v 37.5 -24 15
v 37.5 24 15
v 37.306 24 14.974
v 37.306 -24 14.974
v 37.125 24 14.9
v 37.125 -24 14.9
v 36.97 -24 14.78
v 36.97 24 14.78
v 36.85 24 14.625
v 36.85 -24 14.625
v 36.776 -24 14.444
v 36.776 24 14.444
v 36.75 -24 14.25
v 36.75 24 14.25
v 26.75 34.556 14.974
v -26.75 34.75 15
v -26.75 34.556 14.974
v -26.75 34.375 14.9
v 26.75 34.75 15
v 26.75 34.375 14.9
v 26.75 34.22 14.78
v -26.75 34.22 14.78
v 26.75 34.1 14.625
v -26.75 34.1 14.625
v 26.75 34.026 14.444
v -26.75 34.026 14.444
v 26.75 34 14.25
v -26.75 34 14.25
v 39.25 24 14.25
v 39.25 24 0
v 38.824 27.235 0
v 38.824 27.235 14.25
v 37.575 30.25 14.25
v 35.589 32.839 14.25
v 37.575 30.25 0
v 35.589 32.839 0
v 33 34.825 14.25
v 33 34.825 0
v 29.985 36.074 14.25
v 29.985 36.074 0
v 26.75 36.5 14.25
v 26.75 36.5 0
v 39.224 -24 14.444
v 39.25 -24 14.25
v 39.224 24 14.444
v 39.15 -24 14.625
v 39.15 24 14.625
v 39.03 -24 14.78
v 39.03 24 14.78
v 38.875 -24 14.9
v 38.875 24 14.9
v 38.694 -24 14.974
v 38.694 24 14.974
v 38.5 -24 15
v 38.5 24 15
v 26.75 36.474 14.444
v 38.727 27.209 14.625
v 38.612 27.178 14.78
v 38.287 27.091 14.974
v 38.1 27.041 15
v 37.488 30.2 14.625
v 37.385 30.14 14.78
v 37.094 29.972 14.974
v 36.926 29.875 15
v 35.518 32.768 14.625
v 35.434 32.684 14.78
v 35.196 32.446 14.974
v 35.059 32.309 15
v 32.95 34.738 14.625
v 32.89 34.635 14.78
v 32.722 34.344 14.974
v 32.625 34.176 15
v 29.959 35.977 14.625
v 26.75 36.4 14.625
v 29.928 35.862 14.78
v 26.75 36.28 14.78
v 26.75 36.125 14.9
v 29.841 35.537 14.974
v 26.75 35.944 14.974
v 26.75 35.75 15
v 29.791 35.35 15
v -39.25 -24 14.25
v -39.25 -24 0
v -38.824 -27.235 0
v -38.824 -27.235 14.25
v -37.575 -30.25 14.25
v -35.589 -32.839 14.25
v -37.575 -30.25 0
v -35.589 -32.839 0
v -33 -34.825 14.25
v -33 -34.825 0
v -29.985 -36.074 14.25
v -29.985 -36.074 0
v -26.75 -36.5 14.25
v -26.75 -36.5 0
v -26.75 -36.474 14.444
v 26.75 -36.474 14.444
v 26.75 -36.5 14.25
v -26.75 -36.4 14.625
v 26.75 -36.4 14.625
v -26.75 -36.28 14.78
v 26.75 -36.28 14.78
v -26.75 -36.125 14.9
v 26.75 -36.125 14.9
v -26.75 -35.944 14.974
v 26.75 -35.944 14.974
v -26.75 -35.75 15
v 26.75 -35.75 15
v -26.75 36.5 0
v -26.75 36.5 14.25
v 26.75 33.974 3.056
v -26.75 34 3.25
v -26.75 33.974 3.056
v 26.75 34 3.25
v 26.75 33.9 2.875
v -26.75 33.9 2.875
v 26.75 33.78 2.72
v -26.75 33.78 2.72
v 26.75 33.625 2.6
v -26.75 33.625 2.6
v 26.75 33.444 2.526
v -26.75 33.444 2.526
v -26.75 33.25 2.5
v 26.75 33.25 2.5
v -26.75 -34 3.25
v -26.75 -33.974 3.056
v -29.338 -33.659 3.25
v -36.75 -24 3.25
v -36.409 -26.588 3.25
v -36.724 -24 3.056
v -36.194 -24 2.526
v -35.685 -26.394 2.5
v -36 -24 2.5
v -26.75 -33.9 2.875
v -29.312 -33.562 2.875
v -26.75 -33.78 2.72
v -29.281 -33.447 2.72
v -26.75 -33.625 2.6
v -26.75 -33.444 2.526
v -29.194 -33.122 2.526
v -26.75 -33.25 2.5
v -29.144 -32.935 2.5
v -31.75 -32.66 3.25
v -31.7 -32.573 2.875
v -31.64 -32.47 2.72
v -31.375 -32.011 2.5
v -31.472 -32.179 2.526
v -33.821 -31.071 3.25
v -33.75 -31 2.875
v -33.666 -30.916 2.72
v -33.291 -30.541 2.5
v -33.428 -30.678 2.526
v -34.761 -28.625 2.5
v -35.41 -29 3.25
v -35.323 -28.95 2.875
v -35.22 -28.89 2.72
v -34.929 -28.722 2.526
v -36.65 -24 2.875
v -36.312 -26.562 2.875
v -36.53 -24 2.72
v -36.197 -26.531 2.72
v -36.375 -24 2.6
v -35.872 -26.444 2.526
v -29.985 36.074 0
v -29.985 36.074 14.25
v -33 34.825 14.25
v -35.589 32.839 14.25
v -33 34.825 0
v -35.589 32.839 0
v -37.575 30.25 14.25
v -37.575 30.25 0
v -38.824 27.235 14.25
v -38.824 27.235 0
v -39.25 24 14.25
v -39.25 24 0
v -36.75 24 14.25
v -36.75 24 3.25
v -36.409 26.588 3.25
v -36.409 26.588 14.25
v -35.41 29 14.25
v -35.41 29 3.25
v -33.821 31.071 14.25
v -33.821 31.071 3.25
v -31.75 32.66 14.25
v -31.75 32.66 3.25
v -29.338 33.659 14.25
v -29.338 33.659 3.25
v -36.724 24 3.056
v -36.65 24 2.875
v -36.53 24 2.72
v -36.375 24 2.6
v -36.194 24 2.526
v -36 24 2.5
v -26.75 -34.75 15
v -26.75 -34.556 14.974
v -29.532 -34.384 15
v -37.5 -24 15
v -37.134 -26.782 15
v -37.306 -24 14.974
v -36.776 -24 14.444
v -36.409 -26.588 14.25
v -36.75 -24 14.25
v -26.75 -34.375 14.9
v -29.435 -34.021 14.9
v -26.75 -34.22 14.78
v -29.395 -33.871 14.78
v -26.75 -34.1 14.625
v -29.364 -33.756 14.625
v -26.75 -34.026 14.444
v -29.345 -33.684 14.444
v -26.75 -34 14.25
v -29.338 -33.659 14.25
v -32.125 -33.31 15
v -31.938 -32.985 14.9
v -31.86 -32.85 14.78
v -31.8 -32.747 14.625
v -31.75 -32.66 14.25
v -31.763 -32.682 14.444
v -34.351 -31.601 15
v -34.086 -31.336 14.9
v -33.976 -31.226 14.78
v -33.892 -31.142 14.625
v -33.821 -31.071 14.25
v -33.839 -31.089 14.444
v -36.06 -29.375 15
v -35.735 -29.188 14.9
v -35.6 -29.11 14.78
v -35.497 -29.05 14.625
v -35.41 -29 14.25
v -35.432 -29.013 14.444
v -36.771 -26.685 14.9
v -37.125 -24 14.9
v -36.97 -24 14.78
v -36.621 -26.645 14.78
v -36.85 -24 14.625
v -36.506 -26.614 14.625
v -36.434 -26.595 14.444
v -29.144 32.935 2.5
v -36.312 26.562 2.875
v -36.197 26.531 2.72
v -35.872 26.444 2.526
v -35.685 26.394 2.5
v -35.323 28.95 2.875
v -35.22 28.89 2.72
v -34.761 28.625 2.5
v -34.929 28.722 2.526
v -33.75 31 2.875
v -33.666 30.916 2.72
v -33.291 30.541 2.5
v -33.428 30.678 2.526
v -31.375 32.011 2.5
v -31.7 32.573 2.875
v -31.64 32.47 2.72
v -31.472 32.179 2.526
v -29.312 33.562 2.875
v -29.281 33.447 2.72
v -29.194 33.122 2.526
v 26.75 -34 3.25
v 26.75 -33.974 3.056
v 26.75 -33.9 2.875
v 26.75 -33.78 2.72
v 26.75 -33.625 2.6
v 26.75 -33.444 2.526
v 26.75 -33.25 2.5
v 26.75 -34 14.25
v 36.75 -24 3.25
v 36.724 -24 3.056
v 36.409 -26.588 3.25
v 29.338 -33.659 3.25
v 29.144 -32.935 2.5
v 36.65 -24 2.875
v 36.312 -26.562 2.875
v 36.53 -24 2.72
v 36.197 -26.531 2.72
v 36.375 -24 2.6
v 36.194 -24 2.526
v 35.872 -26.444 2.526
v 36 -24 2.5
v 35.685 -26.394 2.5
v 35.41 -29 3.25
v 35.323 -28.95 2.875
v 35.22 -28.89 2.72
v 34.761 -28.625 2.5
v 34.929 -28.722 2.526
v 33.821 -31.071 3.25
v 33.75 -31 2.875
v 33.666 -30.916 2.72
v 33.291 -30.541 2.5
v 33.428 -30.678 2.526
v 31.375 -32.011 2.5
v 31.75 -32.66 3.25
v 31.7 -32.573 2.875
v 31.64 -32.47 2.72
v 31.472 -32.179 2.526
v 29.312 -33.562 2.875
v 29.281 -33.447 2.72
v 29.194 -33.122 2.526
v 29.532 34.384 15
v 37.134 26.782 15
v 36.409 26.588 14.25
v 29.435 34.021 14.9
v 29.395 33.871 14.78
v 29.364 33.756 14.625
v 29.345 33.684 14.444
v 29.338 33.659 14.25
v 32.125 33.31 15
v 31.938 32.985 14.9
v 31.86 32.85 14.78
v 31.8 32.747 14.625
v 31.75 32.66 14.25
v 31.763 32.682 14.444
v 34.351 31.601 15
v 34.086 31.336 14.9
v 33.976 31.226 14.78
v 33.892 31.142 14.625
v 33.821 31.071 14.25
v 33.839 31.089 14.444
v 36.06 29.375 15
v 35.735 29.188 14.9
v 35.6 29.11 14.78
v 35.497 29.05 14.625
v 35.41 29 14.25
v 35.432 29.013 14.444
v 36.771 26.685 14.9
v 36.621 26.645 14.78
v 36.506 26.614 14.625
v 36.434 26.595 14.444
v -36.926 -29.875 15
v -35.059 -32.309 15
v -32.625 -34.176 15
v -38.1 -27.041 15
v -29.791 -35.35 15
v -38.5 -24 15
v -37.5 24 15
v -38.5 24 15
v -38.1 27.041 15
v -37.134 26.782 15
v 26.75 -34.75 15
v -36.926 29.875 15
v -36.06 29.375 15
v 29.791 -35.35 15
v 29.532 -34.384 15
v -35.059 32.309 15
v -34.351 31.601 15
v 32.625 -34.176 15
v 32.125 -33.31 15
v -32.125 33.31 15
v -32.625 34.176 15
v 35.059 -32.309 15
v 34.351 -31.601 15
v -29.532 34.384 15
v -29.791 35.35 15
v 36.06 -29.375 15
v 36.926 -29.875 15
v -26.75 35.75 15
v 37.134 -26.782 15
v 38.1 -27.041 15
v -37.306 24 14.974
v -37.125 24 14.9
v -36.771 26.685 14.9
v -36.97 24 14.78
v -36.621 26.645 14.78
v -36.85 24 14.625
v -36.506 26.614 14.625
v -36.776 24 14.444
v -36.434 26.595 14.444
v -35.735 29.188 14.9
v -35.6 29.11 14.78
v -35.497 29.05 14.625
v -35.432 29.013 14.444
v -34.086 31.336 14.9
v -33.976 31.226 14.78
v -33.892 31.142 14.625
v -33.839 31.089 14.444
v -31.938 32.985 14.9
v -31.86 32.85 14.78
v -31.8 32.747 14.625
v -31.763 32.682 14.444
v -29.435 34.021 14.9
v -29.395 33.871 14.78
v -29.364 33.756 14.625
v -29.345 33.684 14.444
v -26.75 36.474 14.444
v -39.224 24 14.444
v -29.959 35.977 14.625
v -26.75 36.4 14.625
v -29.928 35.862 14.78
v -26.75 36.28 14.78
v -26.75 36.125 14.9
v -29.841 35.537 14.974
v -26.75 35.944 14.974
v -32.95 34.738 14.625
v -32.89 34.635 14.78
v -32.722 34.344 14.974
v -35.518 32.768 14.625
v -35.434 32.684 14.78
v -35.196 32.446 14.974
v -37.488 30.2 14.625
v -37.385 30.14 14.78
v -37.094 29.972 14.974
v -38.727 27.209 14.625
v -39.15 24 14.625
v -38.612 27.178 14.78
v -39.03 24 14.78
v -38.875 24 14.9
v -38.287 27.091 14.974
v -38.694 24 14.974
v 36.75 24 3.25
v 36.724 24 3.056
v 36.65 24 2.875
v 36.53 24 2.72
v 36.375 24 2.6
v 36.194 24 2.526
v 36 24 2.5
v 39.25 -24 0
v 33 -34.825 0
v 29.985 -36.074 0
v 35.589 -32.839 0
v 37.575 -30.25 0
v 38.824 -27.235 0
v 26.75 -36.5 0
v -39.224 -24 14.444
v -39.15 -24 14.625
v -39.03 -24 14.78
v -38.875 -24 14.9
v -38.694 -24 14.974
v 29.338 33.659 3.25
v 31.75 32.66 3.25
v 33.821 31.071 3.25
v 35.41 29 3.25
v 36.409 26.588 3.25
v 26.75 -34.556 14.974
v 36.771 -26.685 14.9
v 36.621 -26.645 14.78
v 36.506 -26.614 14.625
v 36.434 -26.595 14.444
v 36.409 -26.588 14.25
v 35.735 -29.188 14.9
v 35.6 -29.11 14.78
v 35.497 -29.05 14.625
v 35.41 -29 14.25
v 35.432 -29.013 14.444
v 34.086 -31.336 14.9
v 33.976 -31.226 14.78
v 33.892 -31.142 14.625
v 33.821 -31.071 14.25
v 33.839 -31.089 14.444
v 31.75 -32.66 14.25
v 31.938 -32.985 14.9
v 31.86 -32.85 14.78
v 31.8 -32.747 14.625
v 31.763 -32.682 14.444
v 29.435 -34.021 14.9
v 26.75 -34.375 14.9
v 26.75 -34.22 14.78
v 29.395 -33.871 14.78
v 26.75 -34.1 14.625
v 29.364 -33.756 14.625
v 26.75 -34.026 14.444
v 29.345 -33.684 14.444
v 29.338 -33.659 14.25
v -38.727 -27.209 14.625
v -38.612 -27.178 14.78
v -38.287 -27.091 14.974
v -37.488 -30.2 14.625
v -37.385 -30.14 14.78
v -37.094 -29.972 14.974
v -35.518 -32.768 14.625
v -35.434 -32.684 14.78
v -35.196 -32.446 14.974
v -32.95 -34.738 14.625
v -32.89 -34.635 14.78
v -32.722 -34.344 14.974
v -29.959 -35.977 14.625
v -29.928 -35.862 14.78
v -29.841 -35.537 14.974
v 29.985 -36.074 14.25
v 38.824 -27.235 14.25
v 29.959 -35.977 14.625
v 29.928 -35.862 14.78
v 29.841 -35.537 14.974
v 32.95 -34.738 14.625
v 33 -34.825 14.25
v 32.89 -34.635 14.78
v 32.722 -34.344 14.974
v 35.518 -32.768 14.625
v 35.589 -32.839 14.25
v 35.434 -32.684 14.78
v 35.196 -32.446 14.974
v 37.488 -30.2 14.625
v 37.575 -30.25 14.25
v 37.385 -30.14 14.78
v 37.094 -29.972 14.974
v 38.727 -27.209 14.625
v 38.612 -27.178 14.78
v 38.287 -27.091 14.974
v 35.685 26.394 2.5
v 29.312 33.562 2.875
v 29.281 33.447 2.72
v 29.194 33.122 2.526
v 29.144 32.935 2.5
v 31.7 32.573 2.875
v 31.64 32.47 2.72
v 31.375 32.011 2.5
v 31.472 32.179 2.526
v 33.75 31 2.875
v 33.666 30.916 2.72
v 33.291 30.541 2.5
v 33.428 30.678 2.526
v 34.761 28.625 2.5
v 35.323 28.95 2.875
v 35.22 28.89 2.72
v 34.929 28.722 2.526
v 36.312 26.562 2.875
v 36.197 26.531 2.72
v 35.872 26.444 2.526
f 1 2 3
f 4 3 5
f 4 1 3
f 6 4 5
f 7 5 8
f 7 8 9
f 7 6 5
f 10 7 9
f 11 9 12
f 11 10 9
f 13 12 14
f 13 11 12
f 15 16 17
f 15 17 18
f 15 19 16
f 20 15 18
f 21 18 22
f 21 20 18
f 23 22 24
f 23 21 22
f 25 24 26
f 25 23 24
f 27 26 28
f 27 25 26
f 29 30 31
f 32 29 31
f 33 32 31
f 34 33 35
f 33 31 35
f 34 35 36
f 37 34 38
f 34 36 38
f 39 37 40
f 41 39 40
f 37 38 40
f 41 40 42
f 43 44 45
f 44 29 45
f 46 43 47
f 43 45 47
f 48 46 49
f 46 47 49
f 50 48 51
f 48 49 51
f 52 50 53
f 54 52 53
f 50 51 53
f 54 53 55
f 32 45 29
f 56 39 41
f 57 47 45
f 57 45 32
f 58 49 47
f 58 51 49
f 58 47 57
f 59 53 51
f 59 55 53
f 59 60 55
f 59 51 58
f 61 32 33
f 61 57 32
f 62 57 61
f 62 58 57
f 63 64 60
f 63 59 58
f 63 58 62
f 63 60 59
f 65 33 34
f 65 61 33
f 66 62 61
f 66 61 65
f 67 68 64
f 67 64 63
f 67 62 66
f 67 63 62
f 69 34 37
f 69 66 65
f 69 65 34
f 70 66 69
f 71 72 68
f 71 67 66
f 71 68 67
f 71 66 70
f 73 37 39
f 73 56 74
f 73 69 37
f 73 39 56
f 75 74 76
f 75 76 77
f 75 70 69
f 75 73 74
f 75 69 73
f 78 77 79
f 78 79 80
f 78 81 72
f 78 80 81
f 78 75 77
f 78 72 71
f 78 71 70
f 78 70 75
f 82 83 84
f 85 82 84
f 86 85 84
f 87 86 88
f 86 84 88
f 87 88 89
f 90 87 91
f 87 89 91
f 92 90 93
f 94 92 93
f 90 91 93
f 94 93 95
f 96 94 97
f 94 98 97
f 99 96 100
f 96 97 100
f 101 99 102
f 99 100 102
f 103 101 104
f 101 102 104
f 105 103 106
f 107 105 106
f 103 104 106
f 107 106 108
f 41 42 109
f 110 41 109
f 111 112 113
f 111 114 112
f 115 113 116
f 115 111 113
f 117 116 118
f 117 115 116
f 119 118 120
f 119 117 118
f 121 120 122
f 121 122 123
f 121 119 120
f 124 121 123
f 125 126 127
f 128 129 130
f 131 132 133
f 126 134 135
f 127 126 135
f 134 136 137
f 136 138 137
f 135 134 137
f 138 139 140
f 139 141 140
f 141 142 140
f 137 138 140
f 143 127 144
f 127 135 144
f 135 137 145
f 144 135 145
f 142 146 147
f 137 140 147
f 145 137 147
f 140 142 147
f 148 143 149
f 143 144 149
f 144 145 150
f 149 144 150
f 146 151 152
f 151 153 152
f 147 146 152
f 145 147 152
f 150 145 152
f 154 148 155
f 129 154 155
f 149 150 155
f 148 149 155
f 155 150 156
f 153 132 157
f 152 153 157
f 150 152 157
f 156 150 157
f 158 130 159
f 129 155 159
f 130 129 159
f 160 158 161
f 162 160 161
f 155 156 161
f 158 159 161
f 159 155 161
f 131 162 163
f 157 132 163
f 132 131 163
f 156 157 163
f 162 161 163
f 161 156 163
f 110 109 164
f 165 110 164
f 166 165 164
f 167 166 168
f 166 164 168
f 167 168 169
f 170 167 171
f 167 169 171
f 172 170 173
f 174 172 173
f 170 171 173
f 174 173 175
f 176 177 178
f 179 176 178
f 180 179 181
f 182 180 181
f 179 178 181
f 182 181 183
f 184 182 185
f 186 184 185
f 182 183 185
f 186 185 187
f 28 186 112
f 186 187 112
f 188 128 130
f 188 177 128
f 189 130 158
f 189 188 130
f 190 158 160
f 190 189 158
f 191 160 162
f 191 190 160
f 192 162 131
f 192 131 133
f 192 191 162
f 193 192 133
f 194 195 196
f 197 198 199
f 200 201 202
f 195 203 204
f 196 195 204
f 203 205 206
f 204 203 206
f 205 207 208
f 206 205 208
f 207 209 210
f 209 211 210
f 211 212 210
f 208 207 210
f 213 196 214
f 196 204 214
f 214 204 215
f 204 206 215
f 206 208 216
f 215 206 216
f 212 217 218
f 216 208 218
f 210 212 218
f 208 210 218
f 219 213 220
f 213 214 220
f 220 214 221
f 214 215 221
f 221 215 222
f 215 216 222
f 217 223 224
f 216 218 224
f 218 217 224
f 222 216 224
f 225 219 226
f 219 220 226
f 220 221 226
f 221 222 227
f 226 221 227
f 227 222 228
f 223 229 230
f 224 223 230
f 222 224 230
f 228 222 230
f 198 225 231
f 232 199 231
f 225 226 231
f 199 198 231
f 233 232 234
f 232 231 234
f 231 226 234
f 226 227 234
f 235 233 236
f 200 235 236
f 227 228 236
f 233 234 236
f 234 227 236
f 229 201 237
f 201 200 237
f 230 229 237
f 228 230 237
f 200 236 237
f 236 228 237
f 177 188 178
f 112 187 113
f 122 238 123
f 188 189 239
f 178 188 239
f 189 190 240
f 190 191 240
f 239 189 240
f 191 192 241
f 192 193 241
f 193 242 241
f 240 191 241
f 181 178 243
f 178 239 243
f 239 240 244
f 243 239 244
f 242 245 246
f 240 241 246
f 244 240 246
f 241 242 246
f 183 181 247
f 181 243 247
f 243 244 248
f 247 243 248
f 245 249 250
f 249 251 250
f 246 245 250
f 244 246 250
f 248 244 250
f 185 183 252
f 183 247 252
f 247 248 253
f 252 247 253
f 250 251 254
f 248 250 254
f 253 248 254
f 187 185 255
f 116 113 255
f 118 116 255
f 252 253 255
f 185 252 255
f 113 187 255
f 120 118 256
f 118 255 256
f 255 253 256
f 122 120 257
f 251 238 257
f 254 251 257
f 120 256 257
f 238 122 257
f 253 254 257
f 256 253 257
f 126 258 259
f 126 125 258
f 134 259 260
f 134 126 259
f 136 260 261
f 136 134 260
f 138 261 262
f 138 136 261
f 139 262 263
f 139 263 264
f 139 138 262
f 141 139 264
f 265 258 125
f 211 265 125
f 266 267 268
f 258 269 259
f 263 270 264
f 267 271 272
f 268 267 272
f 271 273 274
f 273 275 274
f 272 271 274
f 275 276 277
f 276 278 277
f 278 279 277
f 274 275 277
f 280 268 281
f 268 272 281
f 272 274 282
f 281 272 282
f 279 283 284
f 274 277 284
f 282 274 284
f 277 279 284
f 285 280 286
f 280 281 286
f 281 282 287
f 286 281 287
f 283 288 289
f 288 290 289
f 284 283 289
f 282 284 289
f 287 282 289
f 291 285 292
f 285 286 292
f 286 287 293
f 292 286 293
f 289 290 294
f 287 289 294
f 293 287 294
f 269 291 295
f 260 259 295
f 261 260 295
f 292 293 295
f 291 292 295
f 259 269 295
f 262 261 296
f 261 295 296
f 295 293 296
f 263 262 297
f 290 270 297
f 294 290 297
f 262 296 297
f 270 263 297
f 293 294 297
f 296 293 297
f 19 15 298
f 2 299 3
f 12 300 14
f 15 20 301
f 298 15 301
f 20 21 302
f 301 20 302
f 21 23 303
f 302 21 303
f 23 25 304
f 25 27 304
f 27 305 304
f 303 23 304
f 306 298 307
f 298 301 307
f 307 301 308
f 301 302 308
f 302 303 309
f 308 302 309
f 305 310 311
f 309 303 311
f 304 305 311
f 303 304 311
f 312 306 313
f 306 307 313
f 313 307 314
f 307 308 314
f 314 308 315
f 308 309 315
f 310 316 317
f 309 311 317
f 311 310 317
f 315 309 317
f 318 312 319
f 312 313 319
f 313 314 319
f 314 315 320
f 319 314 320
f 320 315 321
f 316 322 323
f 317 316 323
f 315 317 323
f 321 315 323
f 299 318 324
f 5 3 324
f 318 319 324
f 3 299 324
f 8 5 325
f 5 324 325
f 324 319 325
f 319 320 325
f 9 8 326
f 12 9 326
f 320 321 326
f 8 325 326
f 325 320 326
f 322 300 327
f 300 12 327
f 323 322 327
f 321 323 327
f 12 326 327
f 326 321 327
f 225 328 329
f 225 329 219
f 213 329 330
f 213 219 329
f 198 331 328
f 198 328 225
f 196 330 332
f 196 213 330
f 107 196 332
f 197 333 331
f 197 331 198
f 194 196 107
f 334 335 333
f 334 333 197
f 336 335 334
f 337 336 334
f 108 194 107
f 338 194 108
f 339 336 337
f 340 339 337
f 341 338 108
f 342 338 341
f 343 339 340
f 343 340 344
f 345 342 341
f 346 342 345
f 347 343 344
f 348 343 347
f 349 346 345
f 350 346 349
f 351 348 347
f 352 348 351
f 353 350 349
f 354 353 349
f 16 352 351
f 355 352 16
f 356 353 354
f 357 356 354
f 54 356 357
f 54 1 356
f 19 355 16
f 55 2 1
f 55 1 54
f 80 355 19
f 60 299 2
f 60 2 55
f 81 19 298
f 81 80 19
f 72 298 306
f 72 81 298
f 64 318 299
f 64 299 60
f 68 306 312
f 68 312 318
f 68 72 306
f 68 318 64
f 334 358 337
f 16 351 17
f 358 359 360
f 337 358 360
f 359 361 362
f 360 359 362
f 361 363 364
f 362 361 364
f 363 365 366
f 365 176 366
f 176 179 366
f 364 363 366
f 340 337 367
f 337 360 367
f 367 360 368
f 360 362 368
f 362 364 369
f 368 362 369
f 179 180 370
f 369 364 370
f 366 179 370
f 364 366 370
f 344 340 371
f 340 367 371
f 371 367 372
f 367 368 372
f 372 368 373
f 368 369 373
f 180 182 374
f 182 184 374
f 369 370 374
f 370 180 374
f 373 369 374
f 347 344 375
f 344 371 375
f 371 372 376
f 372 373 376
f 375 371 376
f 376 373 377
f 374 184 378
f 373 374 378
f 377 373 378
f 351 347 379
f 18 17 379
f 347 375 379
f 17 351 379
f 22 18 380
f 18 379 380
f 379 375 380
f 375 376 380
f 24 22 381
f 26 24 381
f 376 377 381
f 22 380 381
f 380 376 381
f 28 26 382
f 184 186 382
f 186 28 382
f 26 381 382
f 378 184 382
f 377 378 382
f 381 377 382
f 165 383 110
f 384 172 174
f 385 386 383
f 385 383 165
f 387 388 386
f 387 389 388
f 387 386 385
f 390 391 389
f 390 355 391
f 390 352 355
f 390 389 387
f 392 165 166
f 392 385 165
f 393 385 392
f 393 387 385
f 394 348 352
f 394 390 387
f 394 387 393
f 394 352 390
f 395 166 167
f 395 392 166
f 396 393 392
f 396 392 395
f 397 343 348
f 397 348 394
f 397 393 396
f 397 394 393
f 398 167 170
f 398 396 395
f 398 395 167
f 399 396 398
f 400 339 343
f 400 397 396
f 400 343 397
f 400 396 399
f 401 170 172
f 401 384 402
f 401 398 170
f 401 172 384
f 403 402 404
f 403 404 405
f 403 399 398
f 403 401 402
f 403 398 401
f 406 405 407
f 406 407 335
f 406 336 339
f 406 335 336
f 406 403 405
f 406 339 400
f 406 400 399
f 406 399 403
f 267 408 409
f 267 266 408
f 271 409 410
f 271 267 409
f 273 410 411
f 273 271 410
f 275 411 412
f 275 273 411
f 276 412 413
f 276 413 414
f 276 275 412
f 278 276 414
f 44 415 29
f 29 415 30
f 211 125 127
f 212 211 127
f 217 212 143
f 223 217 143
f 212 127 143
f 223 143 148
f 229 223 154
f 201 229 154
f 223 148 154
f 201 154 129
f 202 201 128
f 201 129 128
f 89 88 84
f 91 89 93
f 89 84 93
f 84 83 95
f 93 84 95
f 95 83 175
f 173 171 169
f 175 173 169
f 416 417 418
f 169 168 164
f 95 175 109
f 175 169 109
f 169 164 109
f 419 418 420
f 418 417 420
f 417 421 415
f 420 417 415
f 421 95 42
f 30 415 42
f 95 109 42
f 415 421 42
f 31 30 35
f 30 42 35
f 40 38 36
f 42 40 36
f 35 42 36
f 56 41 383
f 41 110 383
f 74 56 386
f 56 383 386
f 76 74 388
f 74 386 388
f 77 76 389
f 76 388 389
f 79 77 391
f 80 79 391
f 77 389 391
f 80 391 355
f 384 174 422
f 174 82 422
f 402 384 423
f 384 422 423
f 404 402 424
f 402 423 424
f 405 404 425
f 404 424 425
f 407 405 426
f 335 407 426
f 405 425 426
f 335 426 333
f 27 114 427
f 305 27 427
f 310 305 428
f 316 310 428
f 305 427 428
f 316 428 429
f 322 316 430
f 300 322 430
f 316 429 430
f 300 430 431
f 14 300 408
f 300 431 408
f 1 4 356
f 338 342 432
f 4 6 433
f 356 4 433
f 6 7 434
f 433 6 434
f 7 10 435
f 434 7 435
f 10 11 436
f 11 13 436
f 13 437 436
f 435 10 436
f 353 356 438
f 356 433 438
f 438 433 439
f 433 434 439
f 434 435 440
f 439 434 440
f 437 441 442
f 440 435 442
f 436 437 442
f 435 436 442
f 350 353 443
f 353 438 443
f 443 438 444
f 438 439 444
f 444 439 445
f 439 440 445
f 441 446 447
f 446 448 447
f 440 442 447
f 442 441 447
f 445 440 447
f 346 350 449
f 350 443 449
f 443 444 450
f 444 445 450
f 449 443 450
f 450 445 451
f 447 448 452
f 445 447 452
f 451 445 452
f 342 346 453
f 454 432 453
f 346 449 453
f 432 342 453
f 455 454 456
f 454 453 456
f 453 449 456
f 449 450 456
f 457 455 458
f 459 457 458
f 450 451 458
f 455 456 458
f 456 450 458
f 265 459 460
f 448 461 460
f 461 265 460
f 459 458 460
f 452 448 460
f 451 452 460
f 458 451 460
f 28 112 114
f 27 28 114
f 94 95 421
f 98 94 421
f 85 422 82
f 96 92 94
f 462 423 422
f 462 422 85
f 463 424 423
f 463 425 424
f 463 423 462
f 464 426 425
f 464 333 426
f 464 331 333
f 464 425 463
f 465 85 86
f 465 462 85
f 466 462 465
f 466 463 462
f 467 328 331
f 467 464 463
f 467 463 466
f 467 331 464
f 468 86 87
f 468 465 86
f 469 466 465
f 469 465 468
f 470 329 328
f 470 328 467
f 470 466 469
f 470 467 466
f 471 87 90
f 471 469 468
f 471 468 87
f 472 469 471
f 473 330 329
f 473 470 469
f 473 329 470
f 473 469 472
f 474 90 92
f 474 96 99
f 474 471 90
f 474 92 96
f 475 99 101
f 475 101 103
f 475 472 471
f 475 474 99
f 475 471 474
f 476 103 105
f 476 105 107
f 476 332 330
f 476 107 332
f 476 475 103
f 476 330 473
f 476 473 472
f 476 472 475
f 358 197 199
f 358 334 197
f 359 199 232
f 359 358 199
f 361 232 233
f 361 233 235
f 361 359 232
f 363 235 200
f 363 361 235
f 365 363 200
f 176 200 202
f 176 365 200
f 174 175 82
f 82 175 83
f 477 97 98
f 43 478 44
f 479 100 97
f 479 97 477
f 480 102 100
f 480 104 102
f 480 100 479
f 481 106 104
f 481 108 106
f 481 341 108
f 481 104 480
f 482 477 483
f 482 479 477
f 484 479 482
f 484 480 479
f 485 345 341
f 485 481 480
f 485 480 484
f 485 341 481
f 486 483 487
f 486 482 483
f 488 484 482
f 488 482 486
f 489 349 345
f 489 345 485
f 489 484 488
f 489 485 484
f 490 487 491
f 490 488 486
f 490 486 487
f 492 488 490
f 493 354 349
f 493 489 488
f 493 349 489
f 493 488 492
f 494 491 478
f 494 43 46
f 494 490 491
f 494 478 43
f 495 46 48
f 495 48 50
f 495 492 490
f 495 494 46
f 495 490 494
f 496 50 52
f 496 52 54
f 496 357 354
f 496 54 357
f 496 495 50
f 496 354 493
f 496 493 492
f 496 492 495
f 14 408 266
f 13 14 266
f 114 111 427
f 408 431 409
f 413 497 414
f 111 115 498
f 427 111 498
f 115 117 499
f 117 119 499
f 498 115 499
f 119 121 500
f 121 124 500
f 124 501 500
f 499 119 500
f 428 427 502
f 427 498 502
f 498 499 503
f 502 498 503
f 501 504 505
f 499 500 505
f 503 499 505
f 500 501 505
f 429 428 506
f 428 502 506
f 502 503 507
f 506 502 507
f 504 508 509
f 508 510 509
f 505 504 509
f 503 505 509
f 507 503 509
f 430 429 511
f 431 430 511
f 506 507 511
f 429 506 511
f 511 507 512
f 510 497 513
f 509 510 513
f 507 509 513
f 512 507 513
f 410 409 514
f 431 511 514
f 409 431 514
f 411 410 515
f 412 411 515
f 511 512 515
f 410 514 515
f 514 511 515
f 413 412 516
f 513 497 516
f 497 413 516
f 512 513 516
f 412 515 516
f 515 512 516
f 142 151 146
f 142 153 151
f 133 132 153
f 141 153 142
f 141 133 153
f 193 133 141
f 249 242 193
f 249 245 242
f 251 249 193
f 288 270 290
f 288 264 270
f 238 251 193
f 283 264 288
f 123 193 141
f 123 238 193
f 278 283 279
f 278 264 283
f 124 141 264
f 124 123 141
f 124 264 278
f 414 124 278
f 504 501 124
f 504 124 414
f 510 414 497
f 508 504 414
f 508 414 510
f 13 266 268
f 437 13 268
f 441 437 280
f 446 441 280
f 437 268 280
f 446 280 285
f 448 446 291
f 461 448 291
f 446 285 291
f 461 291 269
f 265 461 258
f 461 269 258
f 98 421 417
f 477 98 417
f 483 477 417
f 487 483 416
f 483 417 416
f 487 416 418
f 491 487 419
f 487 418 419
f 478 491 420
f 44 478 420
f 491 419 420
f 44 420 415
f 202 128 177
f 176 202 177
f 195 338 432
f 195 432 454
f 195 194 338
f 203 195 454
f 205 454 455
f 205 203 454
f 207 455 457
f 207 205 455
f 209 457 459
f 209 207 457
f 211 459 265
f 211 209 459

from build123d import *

# Parameters (mm, degrees)
F1_DEPTH = 2.5
F2_DEPTH = 15
F3_R     = 0.75


with BuildPart() as f1:
    # F0 (on Top) → F1 (new body)
    with BuildSketch(Plane.XY):
        with BuildLine():
            Line((26.75, 36.5), (-26.75, 36.5))
            ThreePointArc((-26.75, 36.5), (-35.5888347648, 32.8388347648), (-39.25, 24))
            Line((-39.25, 24), (-39.25, -24))
            ThreePointArc((-39.25, -24), (-35.5888347648, -32.8388347648), (-26.75, -36.5))
            Line((-26.75, -36.5), (26.75, -36.5))
            ThreePointArc((26.75, -36.5), (35.5888347648, -32.8388347648), (39.25, -24))
            Line((39.25, -24), (39.25, 24))
            ThreePointArc((39.25, 24), (35.5888347648, 32.8388347648), (26.75, 36.5))
        make_face()
        with BuildLine():
            ThreePointArc((-36.75, 24), (-33.8210678119, 31.0710678119), (-26.75, 34))
            Line((-26.75, 34), (26.75, 34))
            ThreePointArc((26.75, 34), (33.8210678119, 31.0710678119), (36.75, 24))
            Line((36.75, 24), (36.75, -24))
            ThreePointArc((36.75, -24), (33.8210678119, -31.0710678119), (26.75, -34))
            Line((26.75, -34), (-26.75, -34))
            ThreePointArc((-26.75, -34), (-33.8210678119, -31.0710678119), (-36.75, -24))
            Line((-36.75, -24), (-36.75, 24))
        make_face(mode=Mode.SUBTRACT)
        with BuildLine():
            Line((26.75, 34), (-26.75, 34))
            ThreePointArc((-26.75, 34), (-33.8210678119, 31.0710678119), (-36.75, 24))
            Line((-36.75, 24), (-36.75, -24))
            ThreePointArc((-36.75, -24), (-33.8210678119, -31.0710678119), (-26.75, -34))
            Line((-26.75, -34), (26.75, -34))
            ThreePointArc((26.75, -34), (33.8210678119, -31.0710678119), (36.75, -24))
            Line((36.75, -24), (36.75, 24))
            ThreePointArc((36.75, 24), (33.8210678119, 31.0710678119), (26.75, 34))
        make_face()
    extrude(amount=F1_DEPTH)

    # F0 (on Top) → F2 (join)
    with BuildSketch(Plane.XY):
        with BuildLine():
            Line((26.75, 36.5), (-26.75, 36.5))
            ThreePointArc((-26.75, 36.5), (-35.5888347648, 32.8388347648), (-39.25, 24))
            Line((-39.25, 24), (-39.25, -24))
            ThreePointArc((-39.25, -24), (-35.5888347648, -32.8388347648), (-26.75, -36.5))
            Line((-26.75, -36.5), (26.75, -36.5))
            ThreePointArc((26.75, -36.5), (35.5888347648, -32.8388347648), (39.25, -24))
            Line((39.25, -24), (39.25, 24))
            ThreePointArc((39.25, 24), (35.5888347648, 32.8388347648), (26.75, 36.5))
        make_face()
        with BuildLine():
            ThreePointArc((-36.75, 24), (-33.8210678119, 31.0710678119), (-26.75, 34))
            Line((-26.75, 34), (26.75, 34))
            ThreePointArc((26.75, 34), (33.8210678119, 31.0710678119), (36.75, 24))
            Line((36.75, 24), (36.75, -24))
            ThreePointArc((36.75, -24), (33.8210678119, -31.0710678119), (26.75, -34))
            Line((26.75, -34), (-26.75, -34))
            ThreePointArc((-26.75, -34), (-33.8210678119, -31.0710678119), (-36.75, -24))
            Line((-36.75, -24), (-36.75, 24))
        make_face(mode=Mode.SUBTRACT)
    extrude(amount=F2_DEPTH)

    # F3
    f3_edges = [f1.edges().sort_by_distance(p)[0] for p in [
        (0, 36.5, 15),
        (-35.588835, 32.838835, 15),
        (-39.25, 0, 15),
        (-35.588835, -32.838835, 15),
        (0, -36.5, 15),
        (35.588835, -32.838835, 15),
        (39.25, 0, 15),
        (35.588835, 32.838835, 15),
        (-33.821068, 31.071068, 15),
        (0, 34, 15),
        (33.821068, 31.071068, 15),
        (36.75, 0, 15),
        (33.821068, -31.071068, 15),
        (0, -34, 15),
        (-33.821068, -31.071068, 15),
        (-36.75, 0, 15),
        (-33.821068, 31.071068, 2.5),
        (0, 34, 2.5),
        (33.821068, 31.071068, 2.5),
        (36.75, 0, 2.5),
        (33.821068, -31.071068, 2.5),
        (0, -34, 2.5),
        (-33.821068, -31.071068, 2.5),
        (-36.75, 0, 2.5),
    ]]
    fillet(f3_edges, radius=F3_R)


solid = f1.part
